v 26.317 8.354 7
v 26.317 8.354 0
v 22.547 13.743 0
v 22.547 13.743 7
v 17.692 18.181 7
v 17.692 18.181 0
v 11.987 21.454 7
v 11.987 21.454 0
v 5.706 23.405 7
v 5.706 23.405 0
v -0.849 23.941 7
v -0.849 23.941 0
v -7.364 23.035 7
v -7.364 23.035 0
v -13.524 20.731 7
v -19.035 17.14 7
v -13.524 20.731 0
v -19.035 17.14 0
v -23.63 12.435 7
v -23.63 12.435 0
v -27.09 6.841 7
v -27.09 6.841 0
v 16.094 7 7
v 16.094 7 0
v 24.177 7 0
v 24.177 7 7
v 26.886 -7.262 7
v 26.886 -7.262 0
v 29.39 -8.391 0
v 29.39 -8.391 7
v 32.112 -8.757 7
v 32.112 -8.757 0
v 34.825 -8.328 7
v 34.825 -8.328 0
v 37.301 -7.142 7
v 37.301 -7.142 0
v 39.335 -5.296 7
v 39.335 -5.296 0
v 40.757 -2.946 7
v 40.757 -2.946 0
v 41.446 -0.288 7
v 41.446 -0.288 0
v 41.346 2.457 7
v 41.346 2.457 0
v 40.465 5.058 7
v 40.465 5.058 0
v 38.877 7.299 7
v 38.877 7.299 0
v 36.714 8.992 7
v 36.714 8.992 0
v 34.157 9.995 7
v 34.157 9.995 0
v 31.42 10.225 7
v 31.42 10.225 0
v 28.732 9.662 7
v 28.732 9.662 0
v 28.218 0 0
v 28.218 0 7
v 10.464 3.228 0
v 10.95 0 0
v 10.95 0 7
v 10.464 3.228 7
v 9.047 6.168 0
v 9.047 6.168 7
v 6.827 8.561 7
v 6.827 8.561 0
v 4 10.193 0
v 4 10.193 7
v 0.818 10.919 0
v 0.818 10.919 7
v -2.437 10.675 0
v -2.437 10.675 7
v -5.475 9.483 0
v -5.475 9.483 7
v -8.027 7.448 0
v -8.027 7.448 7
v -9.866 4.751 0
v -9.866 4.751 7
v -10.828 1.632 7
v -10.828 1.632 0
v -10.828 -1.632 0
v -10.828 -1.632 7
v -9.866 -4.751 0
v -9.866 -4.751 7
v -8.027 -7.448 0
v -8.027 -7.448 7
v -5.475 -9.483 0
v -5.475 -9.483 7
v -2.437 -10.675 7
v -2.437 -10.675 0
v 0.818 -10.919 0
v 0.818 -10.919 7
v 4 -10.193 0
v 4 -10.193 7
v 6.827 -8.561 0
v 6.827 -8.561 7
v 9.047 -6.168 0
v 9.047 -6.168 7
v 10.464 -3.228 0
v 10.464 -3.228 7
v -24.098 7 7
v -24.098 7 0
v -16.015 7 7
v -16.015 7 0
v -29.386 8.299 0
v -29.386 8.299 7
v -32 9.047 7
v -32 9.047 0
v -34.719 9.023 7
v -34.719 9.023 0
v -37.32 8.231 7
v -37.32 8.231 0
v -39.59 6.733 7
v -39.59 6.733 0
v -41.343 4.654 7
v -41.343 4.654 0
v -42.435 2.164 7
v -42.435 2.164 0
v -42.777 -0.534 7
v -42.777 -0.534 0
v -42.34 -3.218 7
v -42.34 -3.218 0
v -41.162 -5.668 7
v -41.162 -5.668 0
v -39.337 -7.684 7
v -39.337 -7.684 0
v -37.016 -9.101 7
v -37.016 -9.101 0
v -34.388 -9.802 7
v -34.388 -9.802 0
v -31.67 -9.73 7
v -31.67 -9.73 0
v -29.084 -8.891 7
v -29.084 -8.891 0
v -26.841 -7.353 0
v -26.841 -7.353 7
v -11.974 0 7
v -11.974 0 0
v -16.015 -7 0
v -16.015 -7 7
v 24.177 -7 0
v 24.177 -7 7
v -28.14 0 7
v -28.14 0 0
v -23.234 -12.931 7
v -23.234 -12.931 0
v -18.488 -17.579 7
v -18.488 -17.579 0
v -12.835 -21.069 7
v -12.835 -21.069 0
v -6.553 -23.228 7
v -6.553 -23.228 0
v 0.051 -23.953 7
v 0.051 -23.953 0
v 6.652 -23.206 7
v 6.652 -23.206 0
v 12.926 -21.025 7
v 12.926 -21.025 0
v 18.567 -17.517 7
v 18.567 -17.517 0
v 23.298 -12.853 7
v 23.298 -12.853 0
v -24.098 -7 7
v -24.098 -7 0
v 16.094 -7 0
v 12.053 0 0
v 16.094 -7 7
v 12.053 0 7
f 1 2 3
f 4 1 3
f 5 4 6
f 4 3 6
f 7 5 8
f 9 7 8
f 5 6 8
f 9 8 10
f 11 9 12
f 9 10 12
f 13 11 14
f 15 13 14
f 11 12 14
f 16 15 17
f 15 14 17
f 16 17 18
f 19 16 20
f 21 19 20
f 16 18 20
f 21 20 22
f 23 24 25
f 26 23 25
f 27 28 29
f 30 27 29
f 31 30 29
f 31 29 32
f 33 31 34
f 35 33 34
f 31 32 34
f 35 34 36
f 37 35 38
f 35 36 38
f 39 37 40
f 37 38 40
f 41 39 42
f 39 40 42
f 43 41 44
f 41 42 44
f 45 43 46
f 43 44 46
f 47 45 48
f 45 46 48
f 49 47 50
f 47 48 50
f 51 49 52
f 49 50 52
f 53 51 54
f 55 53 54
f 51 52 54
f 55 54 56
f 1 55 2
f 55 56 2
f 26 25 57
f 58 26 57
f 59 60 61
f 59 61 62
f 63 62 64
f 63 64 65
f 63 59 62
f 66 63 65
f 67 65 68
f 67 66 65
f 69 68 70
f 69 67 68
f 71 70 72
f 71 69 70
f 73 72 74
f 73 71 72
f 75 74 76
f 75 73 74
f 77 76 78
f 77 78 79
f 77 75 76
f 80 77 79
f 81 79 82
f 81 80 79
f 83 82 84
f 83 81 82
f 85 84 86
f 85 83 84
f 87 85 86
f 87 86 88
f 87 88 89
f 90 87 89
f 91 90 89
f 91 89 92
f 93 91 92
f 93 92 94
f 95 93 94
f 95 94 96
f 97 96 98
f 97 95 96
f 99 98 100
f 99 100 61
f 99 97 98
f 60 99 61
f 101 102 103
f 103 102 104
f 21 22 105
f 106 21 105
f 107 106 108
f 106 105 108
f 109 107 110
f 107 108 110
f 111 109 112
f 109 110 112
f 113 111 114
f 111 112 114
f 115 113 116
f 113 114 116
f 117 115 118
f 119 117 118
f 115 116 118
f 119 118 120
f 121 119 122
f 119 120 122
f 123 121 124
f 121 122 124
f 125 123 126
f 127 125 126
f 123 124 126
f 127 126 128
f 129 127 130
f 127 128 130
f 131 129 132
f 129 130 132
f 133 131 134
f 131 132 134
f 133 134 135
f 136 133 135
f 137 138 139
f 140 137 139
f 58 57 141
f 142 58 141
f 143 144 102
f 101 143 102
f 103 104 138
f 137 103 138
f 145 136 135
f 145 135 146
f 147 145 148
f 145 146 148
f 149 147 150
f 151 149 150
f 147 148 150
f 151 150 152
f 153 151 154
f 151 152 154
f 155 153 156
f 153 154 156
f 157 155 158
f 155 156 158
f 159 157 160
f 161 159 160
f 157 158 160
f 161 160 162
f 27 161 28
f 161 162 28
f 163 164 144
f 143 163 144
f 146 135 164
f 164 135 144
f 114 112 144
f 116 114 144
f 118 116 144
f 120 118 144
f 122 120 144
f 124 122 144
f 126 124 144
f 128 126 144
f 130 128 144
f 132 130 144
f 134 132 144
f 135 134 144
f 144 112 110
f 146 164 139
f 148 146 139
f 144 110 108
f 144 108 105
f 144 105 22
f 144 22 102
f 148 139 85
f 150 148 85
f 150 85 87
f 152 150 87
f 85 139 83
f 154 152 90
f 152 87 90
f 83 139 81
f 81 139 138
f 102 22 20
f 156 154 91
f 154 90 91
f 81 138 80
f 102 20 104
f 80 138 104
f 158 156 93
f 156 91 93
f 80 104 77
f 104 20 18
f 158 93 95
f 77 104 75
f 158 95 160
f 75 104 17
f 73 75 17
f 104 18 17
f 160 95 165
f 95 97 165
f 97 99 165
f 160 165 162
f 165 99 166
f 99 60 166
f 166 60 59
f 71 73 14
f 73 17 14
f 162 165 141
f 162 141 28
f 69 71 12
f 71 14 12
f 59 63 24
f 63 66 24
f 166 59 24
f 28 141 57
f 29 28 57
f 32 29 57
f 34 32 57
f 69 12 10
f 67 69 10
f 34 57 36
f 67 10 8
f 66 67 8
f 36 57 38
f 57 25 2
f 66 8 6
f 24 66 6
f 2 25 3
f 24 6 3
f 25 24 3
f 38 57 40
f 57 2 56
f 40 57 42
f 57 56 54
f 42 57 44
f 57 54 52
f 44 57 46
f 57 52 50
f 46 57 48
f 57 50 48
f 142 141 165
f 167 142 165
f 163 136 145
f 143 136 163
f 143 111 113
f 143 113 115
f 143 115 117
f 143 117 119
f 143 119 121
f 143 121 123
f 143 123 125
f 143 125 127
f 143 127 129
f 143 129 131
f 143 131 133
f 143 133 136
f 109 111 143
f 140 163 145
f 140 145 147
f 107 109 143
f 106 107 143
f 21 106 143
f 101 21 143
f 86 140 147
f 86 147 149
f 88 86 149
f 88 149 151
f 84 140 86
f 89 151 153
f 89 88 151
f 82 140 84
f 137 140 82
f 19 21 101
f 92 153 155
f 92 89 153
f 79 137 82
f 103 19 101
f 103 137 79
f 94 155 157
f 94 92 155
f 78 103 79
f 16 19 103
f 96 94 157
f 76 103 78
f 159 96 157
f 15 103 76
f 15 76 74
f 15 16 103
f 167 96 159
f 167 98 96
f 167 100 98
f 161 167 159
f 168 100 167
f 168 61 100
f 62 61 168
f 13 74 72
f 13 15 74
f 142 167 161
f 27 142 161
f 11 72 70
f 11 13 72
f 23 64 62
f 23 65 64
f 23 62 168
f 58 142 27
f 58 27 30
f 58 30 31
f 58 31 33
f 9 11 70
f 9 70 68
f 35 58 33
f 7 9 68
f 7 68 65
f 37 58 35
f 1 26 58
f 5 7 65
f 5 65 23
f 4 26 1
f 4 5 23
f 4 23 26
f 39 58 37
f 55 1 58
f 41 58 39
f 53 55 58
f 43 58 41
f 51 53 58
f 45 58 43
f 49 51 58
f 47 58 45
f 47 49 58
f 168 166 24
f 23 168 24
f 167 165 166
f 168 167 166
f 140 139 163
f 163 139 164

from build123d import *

# Parameters (mm, degrees)
F0_R     = 10.95
F1_DEPTH = 7


with BuildPart() as f1:
    # F0 (on Top) → F1 (new body)
    with BuildSketch(Plane.XY):
        with BuildLine():
            ThreePointArc((26.886002, -7.262236), (28.368444, -3.711389), (29.384189, 0))
            ThreePointArc((29.384189, 0), (28.162244, 4.291398), (26.317312, 8.35409))
            ThreePointArc((26.317312, 8.35409), (-0.849322, 23.940708), (-27.090225, 6.841477))
            ThreePointArc((-27.090225, 6.841477), (-28.443651, 3.48996), (-29.384189, 0))
            ThreePointArc((-29.384189, 0), (-28.351909, -3.759326), (-26.840855, -7.35305))
            ThreePointArc((-26.840855, -7.35305), (0.050708, -23.95269), (26.886002, -7.262236))
        make_face()
        Polygon((-28.139647, 0), (-24.098195, 7), (-16.015291, 7), (-11.973839, 0), (-16.015291, -7), (-24.098195, -7), align=None, mode=Mode.SUBTRACT)
        Circle(F0_R, mode=Mode.SUBTRACT)
        Polygon((28.21831, 0), (24.176858, -7), (16.093955, -7), (12.052503, 0), (16.093955, 7), (24.176858, 7), align=None, mode=Mode.SUBTRACT)
        with BuildLine():
            ThreePointArc((-29.384189, 0), (-28.443651, 3.48996), (-27.090225, 6.841477))
            ThreePointArc((-27.090225, 6.841477), (-42.77684, -0.53356), (-26.840855, -7.35305))
            ThreePointArc((-26.840855, -7.35305), (-28.351909, -3.759326), (-29.384189, 0))
        make_face()
        with BuildLine():
            ThreePointArc((26.317312, 8.35409), (28.162244, 4.291398), (29.384189, 0))
            ThreePointArc((29.384189, 0), (28.368444, -3.711389), (26.886002, -7.262236))
            ThreePointArc((26.886002, -7.262236), (41.495648, 1.088313), (26.317312, 8.35409))
        make_face()
    extrude(amount=F1_DEPTH)


solid = f1.part
